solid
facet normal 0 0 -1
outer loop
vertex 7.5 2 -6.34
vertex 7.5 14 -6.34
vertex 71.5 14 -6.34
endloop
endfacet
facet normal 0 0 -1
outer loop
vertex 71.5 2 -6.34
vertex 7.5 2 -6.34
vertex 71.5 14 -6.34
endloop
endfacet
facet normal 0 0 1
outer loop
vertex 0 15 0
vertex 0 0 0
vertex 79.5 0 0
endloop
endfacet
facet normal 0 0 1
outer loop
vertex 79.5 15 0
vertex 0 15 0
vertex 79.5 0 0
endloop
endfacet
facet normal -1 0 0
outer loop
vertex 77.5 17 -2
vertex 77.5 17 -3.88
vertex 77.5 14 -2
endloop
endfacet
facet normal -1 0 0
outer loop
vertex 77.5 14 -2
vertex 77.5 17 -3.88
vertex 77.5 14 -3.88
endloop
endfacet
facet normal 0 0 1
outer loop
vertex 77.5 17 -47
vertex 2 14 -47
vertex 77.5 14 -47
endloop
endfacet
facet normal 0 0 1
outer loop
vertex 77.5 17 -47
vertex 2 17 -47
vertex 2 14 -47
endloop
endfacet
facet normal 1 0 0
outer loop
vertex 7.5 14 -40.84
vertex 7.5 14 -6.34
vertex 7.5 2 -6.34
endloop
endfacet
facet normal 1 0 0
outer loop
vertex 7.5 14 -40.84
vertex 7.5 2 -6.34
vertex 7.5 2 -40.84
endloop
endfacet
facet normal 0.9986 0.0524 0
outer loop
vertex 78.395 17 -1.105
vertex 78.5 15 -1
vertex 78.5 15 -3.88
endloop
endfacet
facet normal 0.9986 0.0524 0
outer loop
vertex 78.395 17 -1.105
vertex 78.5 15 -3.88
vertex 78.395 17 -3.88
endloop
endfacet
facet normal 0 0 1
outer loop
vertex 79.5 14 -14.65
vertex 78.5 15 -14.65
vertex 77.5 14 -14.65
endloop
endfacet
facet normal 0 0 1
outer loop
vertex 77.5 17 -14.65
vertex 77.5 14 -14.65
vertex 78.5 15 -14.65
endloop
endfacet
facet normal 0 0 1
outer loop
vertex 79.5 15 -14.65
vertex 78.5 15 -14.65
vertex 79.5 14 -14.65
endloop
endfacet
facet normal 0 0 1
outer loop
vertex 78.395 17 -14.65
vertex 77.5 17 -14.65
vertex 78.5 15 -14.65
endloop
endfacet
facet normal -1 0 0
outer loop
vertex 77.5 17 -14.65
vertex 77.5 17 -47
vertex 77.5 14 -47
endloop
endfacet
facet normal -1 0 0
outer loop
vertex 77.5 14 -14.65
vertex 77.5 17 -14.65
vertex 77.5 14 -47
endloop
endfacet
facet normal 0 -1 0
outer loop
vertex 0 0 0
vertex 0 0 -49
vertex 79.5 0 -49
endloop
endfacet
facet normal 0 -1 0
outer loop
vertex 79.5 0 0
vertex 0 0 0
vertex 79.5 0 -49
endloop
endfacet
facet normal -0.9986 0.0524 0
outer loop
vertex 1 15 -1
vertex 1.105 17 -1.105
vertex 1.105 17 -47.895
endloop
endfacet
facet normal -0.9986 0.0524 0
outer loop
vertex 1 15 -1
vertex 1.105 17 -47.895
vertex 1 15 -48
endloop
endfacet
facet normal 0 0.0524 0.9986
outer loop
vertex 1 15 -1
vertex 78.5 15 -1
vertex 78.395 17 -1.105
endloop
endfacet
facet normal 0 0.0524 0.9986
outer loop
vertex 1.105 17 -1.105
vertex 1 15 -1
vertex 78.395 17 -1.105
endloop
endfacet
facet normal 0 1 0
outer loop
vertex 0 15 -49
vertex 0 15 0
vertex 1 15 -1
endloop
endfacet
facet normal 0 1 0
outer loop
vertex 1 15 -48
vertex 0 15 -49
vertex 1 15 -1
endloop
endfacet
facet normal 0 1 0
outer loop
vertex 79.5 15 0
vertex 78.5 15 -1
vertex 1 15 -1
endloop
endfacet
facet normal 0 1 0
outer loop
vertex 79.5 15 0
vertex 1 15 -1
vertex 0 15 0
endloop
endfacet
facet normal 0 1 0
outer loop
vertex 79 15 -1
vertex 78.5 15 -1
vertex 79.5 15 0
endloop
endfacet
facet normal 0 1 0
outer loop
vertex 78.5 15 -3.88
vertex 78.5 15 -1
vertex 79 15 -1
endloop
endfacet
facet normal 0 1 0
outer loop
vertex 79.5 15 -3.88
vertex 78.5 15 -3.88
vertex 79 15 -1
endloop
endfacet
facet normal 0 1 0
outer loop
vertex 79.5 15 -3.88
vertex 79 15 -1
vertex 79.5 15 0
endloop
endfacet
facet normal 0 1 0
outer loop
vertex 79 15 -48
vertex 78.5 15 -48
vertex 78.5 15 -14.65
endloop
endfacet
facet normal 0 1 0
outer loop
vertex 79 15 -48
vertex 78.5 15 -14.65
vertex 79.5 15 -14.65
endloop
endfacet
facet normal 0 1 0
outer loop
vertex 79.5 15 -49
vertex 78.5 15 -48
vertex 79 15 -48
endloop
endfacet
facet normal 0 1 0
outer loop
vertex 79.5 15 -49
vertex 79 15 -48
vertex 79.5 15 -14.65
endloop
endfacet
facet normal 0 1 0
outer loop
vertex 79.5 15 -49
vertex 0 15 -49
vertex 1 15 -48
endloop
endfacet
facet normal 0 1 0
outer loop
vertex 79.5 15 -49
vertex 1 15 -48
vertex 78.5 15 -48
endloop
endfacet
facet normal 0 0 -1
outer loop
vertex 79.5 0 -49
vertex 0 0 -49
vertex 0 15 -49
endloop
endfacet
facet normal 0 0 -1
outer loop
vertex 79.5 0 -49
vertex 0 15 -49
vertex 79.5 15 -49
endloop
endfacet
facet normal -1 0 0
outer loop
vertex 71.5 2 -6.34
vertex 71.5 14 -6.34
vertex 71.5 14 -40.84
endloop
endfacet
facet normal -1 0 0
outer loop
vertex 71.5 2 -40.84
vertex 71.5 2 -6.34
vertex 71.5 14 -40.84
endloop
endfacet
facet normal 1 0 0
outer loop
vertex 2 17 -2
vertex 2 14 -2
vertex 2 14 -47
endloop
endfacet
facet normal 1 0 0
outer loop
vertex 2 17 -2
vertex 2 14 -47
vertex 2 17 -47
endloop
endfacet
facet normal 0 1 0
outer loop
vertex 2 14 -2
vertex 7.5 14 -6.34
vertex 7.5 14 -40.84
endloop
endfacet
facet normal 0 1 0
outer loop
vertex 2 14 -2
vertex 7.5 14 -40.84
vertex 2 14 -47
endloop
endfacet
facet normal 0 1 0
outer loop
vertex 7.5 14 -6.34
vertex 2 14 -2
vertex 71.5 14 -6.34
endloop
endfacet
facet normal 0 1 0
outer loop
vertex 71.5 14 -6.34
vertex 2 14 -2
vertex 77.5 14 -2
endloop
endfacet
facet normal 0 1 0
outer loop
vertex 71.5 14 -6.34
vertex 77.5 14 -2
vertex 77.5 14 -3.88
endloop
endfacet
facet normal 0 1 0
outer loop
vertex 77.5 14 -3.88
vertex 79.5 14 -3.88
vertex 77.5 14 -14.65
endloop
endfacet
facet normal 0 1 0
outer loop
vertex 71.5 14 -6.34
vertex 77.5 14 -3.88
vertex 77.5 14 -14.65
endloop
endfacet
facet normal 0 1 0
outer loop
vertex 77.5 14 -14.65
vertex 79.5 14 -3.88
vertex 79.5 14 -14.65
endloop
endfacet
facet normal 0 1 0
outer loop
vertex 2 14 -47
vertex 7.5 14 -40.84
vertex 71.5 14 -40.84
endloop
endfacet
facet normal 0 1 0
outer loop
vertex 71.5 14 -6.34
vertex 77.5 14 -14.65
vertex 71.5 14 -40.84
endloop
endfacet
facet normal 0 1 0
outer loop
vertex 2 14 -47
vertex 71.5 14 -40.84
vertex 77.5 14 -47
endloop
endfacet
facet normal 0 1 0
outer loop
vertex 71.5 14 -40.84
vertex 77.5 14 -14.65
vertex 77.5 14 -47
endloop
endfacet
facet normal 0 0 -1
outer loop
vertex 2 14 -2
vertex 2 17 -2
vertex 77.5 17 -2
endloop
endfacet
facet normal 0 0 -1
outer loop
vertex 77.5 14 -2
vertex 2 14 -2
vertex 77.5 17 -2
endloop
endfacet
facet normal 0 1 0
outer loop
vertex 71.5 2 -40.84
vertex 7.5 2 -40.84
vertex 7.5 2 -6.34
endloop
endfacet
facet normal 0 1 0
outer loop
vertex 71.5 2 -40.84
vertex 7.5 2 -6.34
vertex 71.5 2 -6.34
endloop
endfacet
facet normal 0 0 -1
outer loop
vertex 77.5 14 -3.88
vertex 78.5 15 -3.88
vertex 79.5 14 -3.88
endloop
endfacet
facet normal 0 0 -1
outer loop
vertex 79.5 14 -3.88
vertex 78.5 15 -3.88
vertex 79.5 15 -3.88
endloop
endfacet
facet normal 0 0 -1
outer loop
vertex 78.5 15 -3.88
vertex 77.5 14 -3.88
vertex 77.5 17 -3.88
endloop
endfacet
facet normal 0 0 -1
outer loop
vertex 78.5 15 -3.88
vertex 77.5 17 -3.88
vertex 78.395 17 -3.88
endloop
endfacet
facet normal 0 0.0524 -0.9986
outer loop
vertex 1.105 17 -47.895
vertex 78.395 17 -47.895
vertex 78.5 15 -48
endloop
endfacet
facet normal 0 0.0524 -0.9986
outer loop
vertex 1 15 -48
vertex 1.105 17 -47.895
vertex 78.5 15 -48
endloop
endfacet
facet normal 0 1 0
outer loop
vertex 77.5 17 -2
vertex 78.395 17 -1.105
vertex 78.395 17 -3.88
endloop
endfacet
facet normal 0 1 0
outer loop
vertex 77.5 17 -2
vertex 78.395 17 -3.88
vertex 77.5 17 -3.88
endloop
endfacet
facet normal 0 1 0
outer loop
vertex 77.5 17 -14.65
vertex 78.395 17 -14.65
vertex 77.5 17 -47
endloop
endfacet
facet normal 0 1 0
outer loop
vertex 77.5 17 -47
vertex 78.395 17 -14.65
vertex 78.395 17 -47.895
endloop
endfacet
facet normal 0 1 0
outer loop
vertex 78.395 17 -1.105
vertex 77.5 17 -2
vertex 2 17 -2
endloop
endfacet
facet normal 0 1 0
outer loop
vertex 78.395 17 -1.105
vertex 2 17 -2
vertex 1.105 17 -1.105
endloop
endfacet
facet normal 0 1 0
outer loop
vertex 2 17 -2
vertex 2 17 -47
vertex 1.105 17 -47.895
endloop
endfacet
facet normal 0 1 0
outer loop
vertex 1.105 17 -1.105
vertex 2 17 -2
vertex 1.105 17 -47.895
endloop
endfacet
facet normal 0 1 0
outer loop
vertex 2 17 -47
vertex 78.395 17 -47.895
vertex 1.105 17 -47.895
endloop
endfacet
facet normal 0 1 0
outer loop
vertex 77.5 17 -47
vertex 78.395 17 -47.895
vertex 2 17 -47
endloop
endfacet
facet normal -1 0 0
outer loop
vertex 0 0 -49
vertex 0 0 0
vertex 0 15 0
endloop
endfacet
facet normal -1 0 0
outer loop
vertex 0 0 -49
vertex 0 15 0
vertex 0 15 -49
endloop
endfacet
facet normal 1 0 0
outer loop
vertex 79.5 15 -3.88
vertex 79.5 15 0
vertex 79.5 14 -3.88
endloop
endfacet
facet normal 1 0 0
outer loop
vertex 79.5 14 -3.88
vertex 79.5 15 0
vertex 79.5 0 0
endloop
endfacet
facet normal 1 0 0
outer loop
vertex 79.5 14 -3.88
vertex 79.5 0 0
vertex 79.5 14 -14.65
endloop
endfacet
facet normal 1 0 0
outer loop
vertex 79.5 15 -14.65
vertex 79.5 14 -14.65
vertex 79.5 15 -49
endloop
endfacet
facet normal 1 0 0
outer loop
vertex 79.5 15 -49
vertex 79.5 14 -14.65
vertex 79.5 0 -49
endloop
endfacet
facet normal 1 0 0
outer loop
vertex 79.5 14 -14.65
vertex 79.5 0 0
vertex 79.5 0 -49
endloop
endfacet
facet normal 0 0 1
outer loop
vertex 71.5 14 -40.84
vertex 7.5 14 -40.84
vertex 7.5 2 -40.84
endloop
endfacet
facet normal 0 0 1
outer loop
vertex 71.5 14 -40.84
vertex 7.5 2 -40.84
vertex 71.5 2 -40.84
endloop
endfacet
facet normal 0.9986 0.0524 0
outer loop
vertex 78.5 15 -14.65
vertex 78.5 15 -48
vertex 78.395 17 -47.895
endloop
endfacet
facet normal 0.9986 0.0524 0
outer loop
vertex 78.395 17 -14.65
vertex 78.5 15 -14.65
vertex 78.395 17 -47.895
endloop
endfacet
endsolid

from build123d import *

# Parameters (mm, degrees)
SKETCH1_W           = 79.5
SKETCH1_H           = 49
BOSS_EXTRUDE1_DEPTH = 15
SKETCH2_W           = 64
SKETCH2_H           = 34.5
CUT_EXTRUDE1_DEPTH  = 13
SKETCH3_W           = 75.5
SKETCH3_H           = 45
CUT_EXTRUDE2_DEPTH  = 1
CUT_EXTRUDE3_REACH  = 96.585
SKETCH5_W           = 10.77
SKETCH5_H           = 1
LIP1_START          = -48
LIP1_DEPTH          = 1
LIP1_START_2        = -2
LIP1_2_DEPTH        = 1
LIP1_START_3        = -47
LIP1_3_DEPTH        = 32.35
LIP1_START_4        = -14.65
LIP1_4_DEPTH        = 12.65
LIP1_START_5        = -3.88
LIP1_5_DEPTH        = 1.88
LIP1_6_DEPTH        = 79


with BuildPart() as part:
    # Sketch1 → Boss-Extrude1 (new body)
    with BuildSketch(Plane(origin=(0, 0, 0), x_dir=(1, 0, 0), z_dir=(0, 1, 0))):
        with Locations((39.75, 24.5)):
            Rectangle(SKETCH1_W, SKETCH1_H)
    extrude(amount=BOSS_EXTRUDE1_DEPTH)

    # Sketch2 → Cut-Extrude1 (cut)
    with BuildSketch(Plane(origin=(0, 15, 0), x_dir=(1, 0, 0), z_dir=(0, 1, 0))):
        with Locations((39.5, 23.59)):
            Rectangle(SKETCH2_W, SKETCH2_H)
    extrude(amount=-CUT_EXTRUDE1_DEPTH, mode=Mode.SUBTRACT)

    # Sketch3 → Cut-Extrude2 (cut)
    with BuildSketch(Plane(origin=(0, 15, 0), x_dir=(1, 0, 0), z_dir=(0, 1, 0))):
        with Locations((39.75, 24.5)):
            Rectangle(SKETCH3_W, SKETCH3_H)
    extrude(amount=-CUT_EXTRUDE2_DEPTH, mode=Mode.SUBTRACT)

    # Sketch5 → Cut-Extrude3 (cut, up to next)
    with BuildSketch(Plane(origin=(79.5, 0, 0), x_dir=(0, 0, -1), z_dir=(1, 0, 0)), mode=Mode.PRIVATE) as cut_extrude3_sk1:
        with Locations((9.265, 14.5)):
            Rectangle(SKETCH5_W, SKETCH5_H)
    cut_extrude3_tool1 = extrude(cut_extrude3_sk1.sketch, amount=-CUT_EXTRUDE3_REACH, mode=Mode.PRIVATE) & part.part
    add(cut_extrude3_tool1.solids().sort_by_distance((79.5, 14.5, -9.265))[0], mode=Mode.SUBTRACT)

    # Lip1: read off the stored shape, not the designer's step
    # Lip1 outline → Lip1 (add)
    with BuildSketch(Plane.XY.offset(LIP1_START)):
        Polygon((78.5, 15), (78.395184441, 17), (1.104815559, 17), (1, 15), align=None)
    extrude(amount=LIP1_DEPTH)

    # Lip1 2 outline → Lip1 2 (add)
    with BuildSketch(Plane.XY.offset(LIP1_START_2)):
        Polygon((78.5, 15), (78.395184441, 17), (1.104815559, 17), (1, 15), align=None)
    extrude(amount=LIP1_2_DEPTH)

    # Lip1 3 outline → Lip1 3 (add)
    with BuildSketch(Plane.XY.offset(LIP1_START_3)):
        Polygon((77.5, 17), (77.5, 15), (78.5, 15), (78.395184441, 17), align=None)
        Polygon((1, 15), (2, 15), (2, 17), (1.104815559, 17), align=None)
    extrude(amount=LIP1_3_DEPTH)

    # Lip1 4 outline → Lip1 4 (add)
    with BuildSketch(Plane.XY.offset(LIP1_START_4)):
        Polygon((1, 15), (2, 15), (2, 17), (1.104815559, 17), align=None)
    extrude(amount=LIP1_4_DEPTH)

    # Lip1 5 outline → Lip1 5 (add)
    with BuildSketch(Plane.XY.offset(LIP1_START_5)):
        Polygon((77.5, 17), (77.5, 15), (78.5, 15), (78.395184441, 17), align=None)
    extrude(amount=LIP1_5_DEPTH)

    # Lip1 6 outline → Lip1 6 (cut)
    with BuildSketch(Plane.YZ):
        Polygon((17, -48), (17, -47.895184441), (15, -48), align=None)
        Polygon((15, -1), (17, -1.104815559), (17, -1), align=None)
    extrude(amount=LIP1_6_DEPTH, mode=Mode.SUBTRACT)


solid = part.part
